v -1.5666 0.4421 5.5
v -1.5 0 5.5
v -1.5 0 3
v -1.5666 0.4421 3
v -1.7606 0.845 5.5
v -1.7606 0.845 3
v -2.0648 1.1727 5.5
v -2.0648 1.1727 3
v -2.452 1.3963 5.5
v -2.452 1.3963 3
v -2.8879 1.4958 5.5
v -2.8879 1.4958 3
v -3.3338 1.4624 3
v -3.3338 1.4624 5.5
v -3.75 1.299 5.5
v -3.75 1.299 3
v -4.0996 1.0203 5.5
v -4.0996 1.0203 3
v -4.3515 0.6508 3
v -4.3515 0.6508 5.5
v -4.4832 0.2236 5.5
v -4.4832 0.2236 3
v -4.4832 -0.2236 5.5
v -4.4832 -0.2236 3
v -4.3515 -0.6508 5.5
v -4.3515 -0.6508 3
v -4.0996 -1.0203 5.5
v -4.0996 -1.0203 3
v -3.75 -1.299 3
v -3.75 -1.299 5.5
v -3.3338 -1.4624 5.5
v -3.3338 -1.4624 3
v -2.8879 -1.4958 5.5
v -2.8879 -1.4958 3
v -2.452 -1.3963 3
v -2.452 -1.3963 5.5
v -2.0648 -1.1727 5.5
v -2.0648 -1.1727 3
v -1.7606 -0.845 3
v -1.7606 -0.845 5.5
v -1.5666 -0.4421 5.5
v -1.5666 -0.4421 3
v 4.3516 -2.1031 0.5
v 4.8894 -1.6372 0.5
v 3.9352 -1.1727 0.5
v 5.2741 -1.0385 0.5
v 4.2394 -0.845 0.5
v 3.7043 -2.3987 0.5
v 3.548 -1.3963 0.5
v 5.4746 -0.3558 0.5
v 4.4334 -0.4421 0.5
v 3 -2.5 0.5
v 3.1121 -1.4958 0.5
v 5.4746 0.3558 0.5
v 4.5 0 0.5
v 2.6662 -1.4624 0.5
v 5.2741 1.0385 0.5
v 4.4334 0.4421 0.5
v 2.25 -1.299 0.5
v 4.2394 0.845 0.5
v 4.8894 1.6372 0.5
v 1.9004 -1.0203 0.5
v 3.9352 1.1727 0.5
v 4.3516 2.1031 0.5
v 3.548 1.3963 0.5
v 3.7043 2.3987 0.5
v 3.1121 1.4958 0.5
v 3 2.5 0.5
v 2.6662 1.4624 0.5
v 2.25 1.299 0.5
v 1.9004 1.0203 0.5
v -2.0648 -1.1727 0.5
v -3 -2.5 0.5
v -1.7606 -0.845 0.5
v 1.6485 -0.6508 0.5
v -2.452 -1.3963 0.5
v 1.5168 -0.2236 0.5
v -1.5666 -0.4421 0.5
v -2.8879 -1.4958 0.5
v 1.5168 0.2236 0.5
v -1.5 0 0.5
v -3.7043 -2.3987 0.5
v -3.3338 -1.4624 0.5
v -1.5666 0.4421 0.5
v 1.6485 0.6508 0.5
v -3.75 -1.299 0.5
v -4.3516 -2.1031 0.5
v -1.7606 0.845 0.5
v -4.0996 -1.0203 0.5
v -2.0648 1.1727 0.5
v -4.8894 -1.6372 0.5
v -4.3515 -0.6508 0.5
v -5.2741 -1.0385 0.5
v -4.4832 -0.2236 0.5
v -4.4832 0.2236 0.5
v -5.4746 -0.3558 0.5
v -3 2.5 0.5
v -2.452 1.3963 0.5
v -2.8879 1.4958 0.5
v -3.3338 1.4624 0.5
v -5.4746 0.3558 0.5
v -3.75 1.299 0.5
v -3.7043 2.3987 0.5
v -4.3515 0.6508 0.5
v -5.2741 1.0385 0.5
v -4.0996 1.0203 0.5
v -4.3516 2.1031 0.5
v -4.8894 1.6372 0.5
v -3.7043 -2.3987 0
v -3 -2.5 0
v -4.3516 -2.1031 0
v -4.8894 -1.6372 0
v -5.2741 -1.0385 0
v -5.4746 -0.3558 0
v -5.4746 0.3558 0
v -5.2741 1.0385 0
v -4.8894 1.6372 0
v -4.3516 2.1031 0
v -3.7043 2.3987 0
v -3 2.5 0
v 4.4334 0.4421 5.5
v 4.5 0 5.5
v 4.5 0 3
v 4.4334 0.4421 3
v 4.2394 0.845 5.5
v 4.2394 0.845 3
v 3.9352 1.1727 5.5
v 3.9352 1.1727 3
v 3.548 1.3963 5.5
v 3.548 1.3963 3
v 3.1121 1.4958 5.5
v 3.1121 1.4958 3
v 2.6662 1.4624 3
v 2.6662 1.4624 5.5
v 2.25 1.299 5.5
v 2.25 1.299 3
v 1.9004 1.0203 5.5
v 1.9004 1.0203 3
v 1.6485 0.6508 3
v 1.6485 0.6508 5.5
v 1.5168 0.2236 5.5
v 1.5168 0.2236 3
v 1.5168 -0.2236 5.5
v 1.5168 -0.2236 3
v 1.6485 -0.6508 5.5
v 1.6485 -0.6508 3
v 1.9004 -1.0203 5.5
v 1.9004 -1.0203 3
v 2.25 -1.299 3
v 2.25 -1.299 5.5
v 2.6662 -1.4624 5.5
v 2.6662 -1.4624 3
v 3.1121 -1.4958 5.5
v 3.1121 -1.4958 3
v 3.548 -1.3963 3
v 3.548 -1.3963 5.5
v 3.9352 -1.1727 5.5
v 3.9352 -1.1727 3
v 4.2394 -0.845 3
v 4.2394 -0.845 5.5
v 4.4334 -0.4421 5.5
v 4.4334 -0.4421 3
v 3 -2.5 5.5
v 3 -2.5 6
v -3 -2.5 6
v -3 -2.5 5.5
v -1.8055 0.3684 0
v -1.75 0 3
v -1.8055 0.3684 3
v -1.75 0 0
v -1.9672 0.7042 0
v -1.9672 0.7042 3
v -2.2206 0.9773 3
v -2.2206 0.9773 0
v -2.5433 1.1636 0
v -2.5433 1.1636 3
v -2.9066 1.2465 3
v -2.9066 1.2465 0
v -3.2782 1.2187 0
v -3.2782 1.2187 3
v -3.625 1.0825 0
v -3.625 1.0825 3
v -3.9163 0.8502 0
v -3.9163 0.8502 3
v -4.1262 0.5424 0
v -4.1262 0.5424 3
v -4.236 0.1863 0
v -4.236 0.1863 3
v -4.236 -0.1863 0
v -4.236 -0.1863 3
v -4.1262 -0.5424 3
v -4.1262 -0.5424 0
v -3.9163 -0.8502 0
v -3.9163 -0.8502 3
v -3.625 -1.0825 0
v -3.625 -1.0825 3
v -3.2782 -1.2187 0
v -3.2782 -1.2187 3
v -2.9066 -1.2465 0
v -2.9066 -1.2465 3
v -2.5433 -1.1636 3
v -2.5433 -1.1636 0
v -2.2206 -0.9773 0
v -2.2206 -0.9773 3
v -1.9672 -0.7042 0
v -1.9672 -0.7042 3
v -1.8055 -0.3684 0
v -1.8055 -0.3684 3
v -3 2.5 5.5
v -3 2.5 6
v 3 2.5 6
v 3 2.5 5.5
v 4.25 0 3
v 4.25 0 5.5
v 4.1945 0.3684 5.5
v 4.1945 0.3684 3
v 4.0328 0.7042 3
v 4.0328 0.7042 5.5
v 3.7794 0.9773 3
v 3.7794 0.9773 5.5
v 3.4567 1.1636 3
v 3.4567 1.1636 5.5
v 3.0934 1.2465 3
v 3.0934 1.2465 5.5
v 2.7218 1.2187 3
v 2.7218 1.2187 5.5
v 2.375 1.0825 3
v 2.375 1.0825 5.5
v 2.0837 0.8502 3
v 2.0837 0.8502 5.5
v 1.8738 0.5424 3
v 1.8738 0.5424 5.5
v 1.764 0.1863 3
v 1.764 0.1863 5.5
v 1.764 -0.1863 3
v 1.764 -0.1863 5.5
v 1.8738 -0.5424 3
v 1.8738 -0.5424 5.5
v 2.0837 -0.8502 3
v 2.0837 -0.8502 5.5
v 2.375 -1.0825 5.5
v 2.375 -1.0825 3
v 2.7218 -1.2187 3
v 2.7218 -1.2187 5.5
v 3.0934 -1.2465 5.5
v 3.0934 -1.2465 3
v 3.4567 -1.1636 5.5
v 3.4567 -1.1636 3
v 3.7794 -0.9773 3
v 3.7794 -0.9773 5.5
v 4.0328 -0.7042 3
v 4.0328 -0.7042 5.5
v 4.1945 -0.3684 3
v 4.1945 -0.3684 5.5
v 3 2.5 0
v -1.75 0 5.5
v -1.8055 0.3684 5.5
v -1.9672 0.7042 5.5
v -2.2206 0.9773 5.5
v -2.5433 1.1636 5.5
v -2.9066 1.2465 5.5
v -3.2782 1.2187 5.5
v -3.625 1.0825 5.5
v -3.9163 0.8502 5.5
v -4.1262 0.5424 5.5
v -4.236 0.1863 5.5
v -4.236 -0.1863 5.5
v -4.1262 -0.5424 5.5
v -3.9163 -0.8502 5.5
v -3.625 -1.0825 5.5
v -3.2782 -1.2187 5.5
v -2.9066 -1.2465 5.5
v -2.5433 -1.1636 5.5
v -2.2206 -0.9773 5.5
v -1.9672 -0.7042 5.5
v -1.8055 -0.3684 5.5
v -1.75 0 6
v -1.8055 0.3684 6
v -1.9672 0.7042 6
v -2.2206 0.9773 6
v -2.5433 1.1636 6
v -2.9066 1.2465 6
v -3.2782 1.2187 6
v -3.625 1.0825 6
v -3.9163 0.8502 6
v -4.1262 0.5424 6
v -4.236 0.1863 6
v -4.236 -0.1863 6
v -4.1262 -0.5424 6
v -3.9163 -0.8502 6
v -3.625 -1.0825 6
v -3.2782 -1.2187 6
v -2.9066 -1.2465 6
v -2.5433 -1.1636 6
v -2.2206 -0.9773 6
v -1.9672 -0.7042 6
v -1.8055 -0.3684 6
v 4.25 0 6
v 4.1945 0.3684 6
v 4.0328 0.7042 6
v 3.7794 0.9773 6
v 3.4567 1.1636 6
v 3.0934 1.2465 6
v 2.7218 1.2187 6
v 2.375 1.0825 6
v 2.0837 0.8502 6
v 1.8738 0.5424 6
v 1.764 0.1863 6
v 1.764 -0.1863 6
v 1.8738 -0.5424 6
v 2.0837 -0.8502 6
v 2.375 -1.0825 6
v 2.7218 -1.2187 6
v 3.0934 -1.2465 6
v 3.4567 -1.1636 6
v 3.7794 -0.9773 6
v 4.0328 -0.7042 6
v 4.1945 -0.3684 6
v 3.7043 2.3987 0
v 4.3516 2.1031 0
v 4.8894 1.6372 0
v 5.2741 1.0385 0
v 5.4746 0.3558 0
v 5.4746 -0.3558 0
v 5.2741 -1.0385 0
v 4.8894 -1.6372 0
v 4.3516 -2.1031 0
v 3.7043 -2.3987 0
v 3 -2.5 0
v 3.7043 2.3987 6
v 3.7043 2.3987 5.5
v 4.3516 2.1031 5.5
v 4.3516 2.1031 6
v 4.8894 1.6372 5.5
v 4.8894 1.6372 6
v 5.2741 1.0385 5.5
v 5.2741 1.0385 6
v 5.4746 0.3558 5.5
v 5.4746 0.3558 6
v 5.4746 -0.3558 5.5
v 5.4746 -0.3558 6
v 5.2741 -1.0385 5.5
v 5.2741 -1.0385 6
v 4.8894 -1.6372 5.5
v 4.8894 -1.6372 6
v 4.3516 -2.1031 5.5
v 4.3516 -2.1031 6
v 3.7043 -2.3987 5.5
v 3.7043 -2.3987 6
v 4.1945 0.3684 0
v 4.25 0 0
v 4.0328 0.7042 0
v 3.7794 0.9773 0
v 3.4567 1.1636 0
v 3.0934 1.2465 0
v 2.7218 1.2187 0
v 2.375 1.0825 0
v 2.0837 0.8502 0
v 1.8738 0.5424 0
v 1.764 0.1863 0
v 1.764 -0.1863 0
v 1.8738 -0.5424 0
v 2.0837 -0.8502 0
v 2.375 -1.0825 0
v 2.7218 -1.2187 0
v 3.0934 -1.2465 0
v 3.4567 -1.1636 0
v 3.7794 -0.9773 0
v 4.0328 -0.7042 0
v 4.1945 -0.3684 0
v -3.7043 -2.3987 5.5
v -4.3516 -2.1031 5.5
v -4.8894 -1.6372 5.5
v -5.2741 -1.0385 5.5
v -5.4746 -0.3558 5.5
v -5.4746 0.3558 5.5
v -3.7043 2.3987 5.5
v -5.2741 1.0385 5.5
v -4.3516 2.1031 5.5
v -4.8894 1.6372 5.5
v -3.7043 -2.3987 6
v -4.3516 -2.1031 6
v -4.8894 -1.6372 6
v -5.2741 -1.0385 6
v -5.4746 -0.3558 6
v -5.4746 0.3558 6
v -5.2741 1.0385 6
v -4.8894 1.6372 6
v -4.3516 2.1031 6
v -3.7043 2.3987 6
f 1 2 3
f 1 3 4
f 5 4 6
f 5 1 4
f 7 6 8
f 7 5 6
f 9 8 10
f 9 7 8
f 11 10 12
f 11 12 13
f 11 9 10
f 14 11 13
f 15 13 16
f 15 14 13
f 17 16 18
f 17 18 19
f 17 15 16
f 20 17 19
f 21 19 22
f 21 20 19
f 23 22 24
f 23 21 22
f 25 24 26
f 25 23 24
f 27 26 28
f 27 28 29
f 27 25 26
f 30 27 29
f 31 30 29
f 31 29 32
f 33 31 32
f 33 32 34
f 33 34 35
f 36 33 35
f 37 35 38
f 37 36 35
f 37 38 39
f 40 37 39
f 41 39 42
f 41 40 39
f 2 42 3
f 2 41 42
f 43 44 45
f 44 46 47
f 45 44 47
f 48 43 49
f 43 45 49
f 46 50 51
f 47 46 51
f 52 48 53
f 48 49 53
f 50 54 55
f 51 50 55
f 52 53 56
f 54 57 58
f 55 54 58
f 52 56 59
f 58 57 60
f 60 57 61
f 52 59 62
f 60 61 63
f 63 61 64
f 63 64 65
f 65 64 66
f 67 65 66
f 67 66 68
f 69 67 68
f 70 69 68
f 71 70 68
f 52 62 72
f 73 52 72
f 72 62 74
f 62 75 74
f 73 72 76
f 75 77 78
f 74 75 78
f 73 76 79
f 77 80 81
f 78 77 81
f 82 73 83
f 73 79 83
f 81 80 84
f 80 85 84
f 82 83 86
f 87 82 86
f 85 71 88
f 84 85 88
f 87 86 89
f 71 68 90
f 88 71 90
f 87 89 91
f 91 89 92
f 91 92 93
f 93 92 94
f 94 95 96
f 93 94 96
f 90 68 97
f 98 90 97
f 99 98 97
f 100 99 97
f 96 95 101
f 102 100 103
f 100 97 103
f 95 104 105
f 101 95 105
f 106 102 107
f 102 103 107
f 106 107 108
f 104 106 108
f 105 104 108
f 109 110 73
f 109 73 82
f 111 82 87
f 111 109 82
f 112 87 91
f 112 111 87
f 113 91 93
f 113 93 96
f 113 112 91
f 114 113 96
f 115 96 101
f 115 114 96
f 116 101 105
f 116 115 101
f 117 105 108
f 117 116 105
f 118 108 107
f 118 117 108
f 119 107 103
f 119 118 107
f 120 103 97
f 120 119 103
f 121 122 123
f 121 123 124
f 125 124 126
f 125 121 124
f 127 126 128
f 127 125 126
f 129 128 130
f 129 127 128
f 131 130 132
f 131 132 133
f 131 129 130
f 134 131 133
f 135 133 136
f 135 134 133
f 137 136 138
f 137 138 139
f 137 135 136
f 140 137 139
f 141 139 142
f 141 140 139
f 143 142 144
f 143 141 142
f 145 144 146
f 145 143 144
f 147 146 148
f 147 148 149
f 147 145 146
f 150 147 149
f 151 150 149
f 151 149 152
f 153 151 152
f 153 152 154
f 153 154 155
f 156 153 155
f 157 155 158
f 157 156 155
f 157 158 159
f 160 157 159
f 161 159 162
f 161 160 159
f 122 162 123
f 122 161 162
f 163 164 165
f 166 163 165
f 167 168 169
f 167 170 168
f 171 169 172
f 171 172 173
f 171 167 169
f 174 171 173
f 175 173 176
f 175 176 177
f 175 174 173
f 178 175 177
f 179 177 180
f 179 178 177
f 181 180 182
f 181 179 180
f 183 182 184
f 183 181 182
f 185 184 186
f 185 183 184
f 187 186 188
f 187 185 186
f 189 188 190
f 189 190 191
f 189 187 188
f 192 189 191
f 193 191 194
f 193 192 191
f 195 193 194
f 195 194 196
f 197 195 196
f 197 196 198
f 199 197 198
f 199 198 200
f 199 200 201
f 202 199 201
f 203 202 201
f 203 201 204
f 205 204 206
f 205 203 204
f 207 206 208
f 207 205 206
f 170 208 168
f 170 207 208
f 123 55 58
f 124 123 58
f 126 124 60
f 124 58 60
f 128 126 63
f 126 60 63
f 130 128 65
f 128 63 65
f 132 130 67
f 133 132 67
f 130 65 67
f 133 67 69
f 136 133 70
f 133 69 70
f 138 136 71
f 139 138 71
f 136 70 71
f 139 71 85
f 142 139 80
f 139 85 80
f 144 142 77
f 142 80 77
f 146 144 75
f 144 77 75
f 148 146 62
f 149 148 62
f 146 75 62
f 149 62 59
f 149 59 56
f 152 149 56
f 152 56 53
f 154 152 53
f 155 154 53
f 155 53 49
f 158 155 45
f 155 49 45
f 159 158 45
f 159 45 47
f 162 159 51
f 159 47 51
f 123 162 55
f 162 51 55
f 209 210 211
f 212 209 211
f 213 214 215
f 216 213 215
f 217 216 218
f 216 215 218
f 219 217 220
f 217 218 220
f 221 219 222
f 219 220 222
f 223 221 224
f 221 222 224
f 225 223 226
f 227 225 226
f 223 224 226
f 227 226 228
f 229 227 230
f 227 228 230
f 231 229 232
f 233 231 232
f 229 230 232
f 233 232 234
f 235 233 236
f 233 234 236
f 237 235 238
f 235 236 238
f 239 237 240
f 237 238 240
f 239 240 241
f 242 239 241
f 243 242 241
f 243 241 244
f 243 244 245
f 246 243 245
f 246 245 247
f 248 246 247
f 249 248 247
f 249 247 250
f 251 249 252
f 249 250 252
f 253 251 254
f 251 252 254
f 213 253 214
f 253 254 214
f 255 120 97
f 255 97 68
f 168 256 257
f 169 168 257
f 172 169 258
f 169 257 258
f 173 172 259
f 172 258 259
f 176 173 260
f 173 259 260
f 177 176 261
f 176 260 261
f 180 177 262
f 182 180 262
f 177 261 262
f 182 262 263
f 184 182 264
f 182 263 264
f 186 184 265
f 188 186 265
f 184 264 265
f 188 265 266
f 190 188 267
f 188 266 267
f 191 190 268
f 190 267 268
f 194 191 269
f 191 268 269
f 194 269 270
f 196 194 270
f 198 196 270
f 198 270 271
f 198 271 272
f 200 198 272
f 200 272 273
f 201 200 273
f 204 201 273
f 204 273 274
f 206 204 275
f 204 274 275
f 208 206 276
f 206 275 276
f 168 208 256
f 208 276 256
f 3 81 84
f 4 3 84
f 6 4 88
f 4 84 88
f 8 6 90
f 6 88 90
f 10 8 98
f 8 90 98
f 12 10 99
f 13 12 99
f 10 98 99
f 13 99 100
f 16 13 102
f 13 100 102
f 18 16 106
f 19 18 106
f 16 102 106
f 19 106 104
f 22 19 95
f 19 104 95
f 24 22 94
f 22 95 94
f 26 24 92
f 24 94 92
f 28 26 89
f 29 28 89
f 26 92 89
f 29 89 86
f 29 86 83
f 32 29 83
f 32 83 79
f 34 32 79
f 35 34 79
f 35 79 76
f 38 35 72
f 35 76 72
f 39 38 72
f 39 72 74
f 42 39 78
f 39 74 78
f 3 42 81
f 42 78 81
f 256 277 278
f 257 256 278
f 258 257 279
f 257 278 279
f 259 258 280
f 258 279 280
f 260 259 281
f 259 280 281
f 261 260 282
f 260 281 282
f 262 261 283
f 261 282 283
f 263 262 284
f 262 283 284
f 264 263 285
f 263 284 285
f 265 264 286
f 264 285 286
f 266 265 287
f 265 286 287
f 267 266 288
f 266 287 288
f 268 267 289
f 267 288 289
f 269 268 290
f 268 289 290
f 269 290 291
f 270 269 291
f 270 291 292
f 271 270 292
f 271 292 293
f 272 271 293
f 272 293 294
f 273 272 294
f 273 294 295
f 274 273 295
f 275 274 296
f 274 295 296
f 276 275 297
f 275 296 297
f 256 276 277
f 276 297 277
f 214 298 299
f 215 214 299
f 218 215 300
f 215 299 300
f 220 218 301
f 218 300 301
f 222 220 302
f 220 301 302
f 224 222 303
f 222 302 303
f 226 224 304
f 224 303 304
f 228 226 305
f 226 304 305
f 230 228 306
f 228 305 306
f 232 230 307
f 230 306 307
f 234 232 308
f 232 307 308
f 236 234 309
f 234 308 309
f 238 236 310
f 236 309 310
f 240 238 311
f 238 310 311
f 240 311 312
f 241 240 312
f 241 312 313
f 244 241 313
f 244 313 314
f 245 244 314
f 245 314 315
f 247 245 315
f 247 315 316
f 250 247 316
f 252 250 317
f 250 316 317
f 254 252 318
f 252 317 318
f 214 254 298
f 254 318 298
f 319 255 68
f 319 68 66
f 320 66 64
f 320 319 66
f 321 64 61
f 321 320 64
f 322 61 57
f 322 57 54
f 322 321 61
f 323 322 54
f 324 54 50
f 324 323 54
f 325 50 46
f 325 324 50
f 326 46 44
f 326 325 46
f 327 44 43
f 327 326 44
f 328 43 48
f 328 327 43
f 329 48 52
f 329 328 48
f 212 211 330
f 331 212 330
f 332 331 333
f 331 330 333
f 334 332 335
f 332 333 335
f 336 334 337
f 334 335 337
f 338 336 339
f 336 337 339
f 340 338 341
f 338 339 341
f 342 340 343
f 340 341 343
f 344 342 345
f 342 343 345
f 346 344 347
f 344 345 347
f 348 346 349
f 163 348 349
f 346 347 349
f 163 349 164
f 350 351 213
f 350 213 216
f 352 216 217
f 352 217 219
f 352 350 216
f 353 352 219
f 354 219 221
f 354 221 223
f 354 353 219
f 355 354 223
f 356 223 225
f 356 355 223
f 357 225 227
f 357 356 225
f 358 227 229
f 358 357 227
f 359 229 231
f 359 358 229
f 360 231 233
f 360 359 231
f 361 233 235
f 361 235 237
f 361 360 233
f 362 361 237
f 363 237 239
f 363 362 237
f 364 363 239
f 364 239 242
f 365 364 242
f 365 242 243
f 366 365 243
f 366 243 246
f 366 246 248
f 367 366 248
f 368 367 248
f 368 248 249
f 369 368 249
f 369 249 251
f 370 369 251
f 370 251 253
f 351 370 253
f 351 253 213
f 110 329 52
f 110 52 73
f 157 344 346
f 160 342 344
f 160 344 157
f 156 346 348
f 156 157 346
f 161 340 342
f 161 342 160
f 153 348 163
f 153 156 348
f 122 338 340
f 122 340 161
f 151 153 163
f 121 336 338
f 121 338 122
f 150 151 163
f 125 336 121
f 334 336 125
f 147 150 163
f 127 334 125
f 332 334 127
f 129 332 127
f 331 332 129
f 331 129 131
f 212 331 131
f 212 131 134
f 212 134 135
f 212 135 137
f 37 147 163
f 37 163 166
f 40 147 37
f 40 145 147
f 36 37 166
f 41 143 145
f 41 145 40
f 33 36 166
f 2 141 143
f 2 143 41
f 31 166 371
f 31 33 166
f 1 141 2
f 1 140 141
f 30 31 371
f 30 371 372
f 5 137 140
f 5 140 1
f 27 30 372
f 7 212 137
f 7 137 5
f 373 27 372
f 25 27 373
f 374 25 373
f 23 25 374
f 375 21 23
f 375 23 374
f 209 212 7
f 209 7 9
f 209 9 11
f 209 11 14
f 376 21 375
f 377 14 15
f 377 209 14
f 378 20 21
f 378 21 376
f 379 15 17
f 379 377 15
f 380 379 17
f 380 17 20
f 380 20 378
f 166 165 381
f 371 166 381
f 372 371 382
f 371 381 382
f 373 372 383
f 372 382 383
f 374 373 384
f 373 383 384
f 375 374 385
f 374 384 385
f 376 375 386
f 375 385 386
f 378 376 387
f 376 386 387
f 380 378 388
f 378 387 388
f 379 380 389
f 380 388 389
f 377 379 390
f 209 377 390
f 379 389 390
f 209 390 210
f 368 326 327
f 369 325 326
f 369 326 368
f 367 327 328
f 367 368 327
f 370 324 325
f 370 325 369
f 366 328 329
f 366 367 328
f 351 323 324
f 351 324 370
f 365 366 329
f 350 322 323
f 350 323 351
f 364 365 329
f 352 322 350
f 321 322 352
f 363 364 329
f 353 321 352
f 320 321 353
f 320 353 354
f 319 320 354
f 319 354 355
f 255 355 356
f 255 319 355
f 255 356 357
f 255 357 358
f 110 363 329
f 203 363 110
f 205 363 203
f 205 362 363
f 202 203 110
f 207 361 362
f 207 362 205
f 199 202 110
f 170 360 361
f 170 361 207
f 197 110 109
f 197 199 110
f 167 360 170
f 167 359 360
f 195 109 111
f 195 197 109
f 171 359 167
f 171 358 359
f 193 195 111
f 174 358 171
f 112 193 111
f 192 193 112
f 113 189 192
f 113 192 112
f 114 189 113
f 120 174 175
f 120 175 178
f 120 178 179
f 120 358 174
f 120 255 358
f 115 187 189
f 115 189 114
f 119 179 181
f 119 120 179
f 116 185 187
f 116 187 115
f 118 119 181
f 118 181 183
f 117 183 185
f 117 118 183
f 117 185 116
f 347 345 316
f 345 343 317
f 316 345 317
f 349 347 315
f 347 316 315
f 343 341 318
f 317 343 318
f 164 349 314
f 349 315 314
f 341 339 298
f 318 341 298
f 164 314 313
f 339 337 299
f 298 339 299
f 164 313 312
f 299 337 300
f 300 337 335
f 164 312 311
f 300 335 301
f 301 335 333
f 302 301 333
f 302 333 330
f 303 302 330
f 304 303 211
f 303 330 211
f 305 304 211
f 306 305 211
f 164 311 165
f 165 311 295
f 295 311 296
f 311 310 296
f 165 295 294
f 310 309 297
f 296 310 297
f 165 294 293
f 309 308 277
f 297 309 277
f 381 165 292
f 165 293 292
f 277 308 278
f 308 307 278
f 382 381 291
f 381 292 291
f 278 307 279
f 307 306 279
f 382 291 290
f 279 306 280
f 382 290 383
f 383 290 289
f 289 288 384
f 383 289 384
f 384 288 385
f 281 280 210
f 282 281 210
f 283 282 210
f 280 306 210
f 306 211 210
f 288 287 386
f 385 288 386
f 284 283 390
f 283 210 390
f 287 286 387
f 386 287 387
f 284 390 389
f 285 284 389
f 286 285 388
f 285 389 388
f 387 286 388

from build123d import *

# Parameters (mm, degrees)
SKETCH1_R           = 1.25
BOSS_EXTRUDE1_DEPTH = 0.5
SKETCH2_R           = 1.5
SKETCH2_R_2         = 1.25
EXTRUDE_THIN1_DEPTH = 2.5


with BuildPart() as part:
    # Sketch1 → Boss-Extrude1 (new body)
    with BuildSketch(Plane.XY):
        with BuildLine():
            Line((-3, 2.5), (3, 2.5))
            ThreePointArc((3, 2.5), (5.5, 0), (3, -2.5))
            Line((3, -2.5), (-3, -2.5))
            ThreePointArc((-3, -2.5), (-5.5, 0), (-3, 2.5))
        make_face()
        with Locations((-3, 0)):
            Circle(SKETCH1_R, mode=Mode.SUBTRACT)
        with Locations((3, 0)):
            Circle(SKETCH1_R, mode=Mode.SUBTRACT)
    boss_extrude1 = extrude(amount=BOSS_EXTRUDE1_DEPTH)

    # Sketch2 → Extrude-Thin1 (add)
    # profile 1 of 2: a face of its own
    with BuildSketch(Plane.XY.offset(0.5)):
        with Locations((-3, 0)):
            Circle(SKETCH2_R)
        with Locations((-3, 0)):
            Circle(SKETCH2_R_2, mode=Mode.SUBTRACT)
    # profile 2 of 2: a face of its own
    with BuildSketch(Plane.XY.offset(0.5)):
        with Locations((3, 0)):
            Circle(SKETCH2_R)
        with Locations((3, 0)):
            Circle(SKETCH2_R_2, mode=Mode.SUBTRACT)
    extrude_thin1 = extrude(amount=EXTRUDE_THIN1_DEPTH)

    # Mirror1: Boss-Extrude1, Extrude-Thin1 across plane
    add(boss_extrude1.mirror(Plane.XY.offset(3)))
    add(extrude_thin1.mirror(Plane.XY.offset(3)))


solid = part.part
